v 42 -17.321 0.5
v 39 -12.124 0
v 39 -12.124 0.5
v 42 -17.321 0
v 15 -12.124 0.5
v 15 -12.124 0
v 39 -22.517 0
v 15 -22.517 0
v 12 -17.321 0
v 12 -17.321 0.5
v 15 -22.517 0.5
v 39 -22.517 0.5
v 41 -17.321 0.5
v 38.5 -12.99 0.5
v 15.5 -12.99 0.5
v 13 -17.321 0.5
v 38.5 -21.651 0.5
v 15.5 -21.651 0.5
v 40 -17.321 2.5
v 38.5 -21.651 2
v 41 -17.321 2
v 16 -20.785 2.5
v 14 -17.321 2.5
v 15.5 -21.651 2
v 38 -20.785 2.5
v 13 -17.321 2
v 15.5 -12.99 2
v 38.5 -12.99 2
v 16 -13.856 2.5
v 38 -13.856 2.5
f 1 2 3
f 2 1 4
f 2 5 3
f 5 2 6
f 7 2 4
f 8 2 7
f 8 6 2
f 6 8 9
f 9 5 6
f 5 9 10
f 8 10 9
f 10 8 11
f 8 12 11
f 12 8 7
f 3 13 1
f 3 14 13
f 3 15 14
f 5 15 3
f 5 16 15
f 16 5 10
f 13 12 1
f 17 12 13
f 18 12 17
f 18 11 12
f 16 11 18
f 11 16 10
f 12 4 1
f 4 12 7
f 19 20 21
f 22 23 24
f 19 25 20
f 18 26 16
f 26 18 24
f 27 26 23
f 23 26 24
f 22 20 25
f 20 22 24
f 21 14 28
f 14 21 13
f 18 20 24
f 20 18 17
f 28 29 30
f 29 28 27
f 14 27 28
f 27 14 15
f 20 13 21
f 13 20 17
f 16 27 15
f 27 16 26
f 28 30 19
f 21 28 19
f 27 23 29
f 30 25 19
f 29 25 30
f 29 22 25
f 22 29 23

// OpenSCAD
// file: ledparts.scad
/**
 * Martin Egli
 * 2024-05-25
 */

// origin: center
module rgbled2427(loc_res = 32) {
    color("White")
    difference() {
        translate([-2.7/2, -2.4/2, 0])
        cube([2.7, 2.4, 1.1]);
        translate([0, 0, 1.0])
        cylinder(d = 2, h = 0.5, $fn = loc_res);
        translate([0, 2, 1])
        rotate([0, 0, -45])
        cube([4, 4, 1]);
    }
}

// origin: center
module rgbled2427_cut(cut_hi = 2) {
    translate([-2.9/2, -2.4/2, -2])
    cube([2.9, 2.4, 2.5]);
    translate([-2.7/2, -2.4/2, 0])
    cube([2.7, 2.4, cut_hi]);
}
*rgbled2427();
*rgbled2427_cut();
// main file
/**
 * Martin Egli
 * 2024-05-28
 * buttons for lighthouse
 */
use <hexagonparts.scad>

hex_rad = 8/2;
/* calculate hexagon center positions
 * r: radius, use "hex_rad"
 * n: index in x axis
 * m: index in y axis
 * even columns
 * dxeven = n*2*r*cos(30)
 * dyeven = m*3/2*r
 * odd columns
 * dxodd = n*3/2*r
 * dyodd = (m-1/2)*r*cos(30)
 * /
dx_even_factor = 3/2*hex_rad; // see dxeven = m*3*r
dy_even_factor = 2*hex_rad*cos(30); // see dyeven = n*2*r*cos(30)
dx_odd_factor = 3/2*hex_rad; // see dxodd = m*3/2*r
dy_odd_factor = hex_rad*cos(30); // see dyodd = (2n+1)*r*cos(30)
*/
dx_even_factor = 3/2*hex_rad; // see dxeven = m*3*r
dy_even_factor = 2*hex_rad*cos(30); // see dyeven = n*2*r*cos(30)
dx_odd_factor = 3/2*hex_rad; // see dxodd = m*3/2*r
dy_odd_factor = hex_rad*cos(30); // see dyodd = (2n+1)*r*cos(30)

module place_button(x_pos = 0, y_pos = 0) {
    if((x_pos % 2) == 0) {
        // even column
        translate([x_pos*dx_even_factor, y_pos*dy_even_factor, 0]) {
            hexagon_element(hex_rad1 = 12/2, hex_hi1 = 0.5);
            hull() {
                hexagon_element(hex_rad1 = 10/2, hex_hi1 = 2);
                hexagon_element(hex_rad1 = 8/2, hex_hi1 = 2.5);
            }
        }
    }
    else {
        // odd column
        translate([x_pos*dx_odd_factor, (2*y_pos-1)*dy_odd_factor, 0]) {
            hexagon_element(hex_rad1 = 12/2, hex_hi1 = 0.5);
            hull() {
                hexagon_element(hex_rad1 = 10/2, hex_hi1 = 2);
                hexagon_element(hex_rad1 = 8/2, hex_hi1 = 2.5);
            }
        }
    }
}
*place_button(1, 0);

module place_long_button(x_pos = 0, y_pos = 0, x_wid = 1) {
    if((x_pos % 2) == 0) {
        // even column
        hull() {
            translate([x_pos*dx_even_factor, y_pos*dy_even_factor, 0])
            hexagon_element(hex_rad1 = 12/2, hex_hi1 = 0.5);
            translate([(x_pos+x_wid)*dx_even_factor, y_pos*dy_even_factor, 0])
            hexagon_element(hex_rad1 = 12/2, hex_hi1 = 0.5);
        }
        hull() {
            translate([x_pos*dx_even_factor, y_pos*dy_even_factor, 0]) {
                hexagon_element(hex_rad1 = 10/2, hex_hi1 = 2);
                hexagon_element(hex_rad1 = 8/2, hex_hi1 = 2.5);
            }
            translate([(x_pos+x_wid)*dx_even_factor, y_pos*dy_even_factor, 0]) {
                hexagon_element(hex_rad1 = 10/2, hex_hi1 = 2);
                hexagon_element(hex_rad1 = 8/2, hex_hi1 = 2.5);
            }
        }
    }
    else {
        // odd column
        hull() {
            translate([x_pos*dx_odd_factor, (2*y_pos-1)*dy_odd_factor, 0])
            hexagon_element(hex_rad1 = 12/2, hex_hi1 = 0.5);
            translate([(x_pos+x_wid)*dx_odd_factor, (2*y_pos-1)*dy_odd_factor, 0])
            hexagon_element(hex_rad1 = 12/2, hex_hi1 = 0.5);
        }
        hull() {
            translate([x_pos*dx_odd_factor, (2*y_pos-1)*dy_odd_factor, 0]) {
                hexagon_element(hex_rad1 = 10/2, hex_hi1 = 2);
                hexagon_element(hex_rad1 = 8/2, hex_hi1 = 2.5);
            }
            translate([(x_pos+x_wid)*dx_odd_factor, (2*y_pos-1)*dy_odd_factor, 0]) {
                hexagon_element(hex_rad1 = 10/2, hex_hi1 = 2);
                hexagon_element(hex_rad1 = 8/2, hex_hi1 = 2.5);
            }
        }
    }
}

place_long_button(3, -2, 3);

module place_button_cutout(x_pos = 0, y_pos = 0) {
    if((x_pos % 2) == 0) {
        // even column
        translate([x_pos*dx_even_factor, y_pos*dy_even_factor, 0])
        hexagon_element(hex_rad1 = 10.5/2, hex_hi1 = 10);
    }
    else {
        // odd column
        translate([x_pos*dx_odd_factor, (2*y_pos-1)*dy_odd_factor, 0])
        hexagon_element(hex_rad1 = 10.5/2, hex_hi1 = 10);
    }
}
